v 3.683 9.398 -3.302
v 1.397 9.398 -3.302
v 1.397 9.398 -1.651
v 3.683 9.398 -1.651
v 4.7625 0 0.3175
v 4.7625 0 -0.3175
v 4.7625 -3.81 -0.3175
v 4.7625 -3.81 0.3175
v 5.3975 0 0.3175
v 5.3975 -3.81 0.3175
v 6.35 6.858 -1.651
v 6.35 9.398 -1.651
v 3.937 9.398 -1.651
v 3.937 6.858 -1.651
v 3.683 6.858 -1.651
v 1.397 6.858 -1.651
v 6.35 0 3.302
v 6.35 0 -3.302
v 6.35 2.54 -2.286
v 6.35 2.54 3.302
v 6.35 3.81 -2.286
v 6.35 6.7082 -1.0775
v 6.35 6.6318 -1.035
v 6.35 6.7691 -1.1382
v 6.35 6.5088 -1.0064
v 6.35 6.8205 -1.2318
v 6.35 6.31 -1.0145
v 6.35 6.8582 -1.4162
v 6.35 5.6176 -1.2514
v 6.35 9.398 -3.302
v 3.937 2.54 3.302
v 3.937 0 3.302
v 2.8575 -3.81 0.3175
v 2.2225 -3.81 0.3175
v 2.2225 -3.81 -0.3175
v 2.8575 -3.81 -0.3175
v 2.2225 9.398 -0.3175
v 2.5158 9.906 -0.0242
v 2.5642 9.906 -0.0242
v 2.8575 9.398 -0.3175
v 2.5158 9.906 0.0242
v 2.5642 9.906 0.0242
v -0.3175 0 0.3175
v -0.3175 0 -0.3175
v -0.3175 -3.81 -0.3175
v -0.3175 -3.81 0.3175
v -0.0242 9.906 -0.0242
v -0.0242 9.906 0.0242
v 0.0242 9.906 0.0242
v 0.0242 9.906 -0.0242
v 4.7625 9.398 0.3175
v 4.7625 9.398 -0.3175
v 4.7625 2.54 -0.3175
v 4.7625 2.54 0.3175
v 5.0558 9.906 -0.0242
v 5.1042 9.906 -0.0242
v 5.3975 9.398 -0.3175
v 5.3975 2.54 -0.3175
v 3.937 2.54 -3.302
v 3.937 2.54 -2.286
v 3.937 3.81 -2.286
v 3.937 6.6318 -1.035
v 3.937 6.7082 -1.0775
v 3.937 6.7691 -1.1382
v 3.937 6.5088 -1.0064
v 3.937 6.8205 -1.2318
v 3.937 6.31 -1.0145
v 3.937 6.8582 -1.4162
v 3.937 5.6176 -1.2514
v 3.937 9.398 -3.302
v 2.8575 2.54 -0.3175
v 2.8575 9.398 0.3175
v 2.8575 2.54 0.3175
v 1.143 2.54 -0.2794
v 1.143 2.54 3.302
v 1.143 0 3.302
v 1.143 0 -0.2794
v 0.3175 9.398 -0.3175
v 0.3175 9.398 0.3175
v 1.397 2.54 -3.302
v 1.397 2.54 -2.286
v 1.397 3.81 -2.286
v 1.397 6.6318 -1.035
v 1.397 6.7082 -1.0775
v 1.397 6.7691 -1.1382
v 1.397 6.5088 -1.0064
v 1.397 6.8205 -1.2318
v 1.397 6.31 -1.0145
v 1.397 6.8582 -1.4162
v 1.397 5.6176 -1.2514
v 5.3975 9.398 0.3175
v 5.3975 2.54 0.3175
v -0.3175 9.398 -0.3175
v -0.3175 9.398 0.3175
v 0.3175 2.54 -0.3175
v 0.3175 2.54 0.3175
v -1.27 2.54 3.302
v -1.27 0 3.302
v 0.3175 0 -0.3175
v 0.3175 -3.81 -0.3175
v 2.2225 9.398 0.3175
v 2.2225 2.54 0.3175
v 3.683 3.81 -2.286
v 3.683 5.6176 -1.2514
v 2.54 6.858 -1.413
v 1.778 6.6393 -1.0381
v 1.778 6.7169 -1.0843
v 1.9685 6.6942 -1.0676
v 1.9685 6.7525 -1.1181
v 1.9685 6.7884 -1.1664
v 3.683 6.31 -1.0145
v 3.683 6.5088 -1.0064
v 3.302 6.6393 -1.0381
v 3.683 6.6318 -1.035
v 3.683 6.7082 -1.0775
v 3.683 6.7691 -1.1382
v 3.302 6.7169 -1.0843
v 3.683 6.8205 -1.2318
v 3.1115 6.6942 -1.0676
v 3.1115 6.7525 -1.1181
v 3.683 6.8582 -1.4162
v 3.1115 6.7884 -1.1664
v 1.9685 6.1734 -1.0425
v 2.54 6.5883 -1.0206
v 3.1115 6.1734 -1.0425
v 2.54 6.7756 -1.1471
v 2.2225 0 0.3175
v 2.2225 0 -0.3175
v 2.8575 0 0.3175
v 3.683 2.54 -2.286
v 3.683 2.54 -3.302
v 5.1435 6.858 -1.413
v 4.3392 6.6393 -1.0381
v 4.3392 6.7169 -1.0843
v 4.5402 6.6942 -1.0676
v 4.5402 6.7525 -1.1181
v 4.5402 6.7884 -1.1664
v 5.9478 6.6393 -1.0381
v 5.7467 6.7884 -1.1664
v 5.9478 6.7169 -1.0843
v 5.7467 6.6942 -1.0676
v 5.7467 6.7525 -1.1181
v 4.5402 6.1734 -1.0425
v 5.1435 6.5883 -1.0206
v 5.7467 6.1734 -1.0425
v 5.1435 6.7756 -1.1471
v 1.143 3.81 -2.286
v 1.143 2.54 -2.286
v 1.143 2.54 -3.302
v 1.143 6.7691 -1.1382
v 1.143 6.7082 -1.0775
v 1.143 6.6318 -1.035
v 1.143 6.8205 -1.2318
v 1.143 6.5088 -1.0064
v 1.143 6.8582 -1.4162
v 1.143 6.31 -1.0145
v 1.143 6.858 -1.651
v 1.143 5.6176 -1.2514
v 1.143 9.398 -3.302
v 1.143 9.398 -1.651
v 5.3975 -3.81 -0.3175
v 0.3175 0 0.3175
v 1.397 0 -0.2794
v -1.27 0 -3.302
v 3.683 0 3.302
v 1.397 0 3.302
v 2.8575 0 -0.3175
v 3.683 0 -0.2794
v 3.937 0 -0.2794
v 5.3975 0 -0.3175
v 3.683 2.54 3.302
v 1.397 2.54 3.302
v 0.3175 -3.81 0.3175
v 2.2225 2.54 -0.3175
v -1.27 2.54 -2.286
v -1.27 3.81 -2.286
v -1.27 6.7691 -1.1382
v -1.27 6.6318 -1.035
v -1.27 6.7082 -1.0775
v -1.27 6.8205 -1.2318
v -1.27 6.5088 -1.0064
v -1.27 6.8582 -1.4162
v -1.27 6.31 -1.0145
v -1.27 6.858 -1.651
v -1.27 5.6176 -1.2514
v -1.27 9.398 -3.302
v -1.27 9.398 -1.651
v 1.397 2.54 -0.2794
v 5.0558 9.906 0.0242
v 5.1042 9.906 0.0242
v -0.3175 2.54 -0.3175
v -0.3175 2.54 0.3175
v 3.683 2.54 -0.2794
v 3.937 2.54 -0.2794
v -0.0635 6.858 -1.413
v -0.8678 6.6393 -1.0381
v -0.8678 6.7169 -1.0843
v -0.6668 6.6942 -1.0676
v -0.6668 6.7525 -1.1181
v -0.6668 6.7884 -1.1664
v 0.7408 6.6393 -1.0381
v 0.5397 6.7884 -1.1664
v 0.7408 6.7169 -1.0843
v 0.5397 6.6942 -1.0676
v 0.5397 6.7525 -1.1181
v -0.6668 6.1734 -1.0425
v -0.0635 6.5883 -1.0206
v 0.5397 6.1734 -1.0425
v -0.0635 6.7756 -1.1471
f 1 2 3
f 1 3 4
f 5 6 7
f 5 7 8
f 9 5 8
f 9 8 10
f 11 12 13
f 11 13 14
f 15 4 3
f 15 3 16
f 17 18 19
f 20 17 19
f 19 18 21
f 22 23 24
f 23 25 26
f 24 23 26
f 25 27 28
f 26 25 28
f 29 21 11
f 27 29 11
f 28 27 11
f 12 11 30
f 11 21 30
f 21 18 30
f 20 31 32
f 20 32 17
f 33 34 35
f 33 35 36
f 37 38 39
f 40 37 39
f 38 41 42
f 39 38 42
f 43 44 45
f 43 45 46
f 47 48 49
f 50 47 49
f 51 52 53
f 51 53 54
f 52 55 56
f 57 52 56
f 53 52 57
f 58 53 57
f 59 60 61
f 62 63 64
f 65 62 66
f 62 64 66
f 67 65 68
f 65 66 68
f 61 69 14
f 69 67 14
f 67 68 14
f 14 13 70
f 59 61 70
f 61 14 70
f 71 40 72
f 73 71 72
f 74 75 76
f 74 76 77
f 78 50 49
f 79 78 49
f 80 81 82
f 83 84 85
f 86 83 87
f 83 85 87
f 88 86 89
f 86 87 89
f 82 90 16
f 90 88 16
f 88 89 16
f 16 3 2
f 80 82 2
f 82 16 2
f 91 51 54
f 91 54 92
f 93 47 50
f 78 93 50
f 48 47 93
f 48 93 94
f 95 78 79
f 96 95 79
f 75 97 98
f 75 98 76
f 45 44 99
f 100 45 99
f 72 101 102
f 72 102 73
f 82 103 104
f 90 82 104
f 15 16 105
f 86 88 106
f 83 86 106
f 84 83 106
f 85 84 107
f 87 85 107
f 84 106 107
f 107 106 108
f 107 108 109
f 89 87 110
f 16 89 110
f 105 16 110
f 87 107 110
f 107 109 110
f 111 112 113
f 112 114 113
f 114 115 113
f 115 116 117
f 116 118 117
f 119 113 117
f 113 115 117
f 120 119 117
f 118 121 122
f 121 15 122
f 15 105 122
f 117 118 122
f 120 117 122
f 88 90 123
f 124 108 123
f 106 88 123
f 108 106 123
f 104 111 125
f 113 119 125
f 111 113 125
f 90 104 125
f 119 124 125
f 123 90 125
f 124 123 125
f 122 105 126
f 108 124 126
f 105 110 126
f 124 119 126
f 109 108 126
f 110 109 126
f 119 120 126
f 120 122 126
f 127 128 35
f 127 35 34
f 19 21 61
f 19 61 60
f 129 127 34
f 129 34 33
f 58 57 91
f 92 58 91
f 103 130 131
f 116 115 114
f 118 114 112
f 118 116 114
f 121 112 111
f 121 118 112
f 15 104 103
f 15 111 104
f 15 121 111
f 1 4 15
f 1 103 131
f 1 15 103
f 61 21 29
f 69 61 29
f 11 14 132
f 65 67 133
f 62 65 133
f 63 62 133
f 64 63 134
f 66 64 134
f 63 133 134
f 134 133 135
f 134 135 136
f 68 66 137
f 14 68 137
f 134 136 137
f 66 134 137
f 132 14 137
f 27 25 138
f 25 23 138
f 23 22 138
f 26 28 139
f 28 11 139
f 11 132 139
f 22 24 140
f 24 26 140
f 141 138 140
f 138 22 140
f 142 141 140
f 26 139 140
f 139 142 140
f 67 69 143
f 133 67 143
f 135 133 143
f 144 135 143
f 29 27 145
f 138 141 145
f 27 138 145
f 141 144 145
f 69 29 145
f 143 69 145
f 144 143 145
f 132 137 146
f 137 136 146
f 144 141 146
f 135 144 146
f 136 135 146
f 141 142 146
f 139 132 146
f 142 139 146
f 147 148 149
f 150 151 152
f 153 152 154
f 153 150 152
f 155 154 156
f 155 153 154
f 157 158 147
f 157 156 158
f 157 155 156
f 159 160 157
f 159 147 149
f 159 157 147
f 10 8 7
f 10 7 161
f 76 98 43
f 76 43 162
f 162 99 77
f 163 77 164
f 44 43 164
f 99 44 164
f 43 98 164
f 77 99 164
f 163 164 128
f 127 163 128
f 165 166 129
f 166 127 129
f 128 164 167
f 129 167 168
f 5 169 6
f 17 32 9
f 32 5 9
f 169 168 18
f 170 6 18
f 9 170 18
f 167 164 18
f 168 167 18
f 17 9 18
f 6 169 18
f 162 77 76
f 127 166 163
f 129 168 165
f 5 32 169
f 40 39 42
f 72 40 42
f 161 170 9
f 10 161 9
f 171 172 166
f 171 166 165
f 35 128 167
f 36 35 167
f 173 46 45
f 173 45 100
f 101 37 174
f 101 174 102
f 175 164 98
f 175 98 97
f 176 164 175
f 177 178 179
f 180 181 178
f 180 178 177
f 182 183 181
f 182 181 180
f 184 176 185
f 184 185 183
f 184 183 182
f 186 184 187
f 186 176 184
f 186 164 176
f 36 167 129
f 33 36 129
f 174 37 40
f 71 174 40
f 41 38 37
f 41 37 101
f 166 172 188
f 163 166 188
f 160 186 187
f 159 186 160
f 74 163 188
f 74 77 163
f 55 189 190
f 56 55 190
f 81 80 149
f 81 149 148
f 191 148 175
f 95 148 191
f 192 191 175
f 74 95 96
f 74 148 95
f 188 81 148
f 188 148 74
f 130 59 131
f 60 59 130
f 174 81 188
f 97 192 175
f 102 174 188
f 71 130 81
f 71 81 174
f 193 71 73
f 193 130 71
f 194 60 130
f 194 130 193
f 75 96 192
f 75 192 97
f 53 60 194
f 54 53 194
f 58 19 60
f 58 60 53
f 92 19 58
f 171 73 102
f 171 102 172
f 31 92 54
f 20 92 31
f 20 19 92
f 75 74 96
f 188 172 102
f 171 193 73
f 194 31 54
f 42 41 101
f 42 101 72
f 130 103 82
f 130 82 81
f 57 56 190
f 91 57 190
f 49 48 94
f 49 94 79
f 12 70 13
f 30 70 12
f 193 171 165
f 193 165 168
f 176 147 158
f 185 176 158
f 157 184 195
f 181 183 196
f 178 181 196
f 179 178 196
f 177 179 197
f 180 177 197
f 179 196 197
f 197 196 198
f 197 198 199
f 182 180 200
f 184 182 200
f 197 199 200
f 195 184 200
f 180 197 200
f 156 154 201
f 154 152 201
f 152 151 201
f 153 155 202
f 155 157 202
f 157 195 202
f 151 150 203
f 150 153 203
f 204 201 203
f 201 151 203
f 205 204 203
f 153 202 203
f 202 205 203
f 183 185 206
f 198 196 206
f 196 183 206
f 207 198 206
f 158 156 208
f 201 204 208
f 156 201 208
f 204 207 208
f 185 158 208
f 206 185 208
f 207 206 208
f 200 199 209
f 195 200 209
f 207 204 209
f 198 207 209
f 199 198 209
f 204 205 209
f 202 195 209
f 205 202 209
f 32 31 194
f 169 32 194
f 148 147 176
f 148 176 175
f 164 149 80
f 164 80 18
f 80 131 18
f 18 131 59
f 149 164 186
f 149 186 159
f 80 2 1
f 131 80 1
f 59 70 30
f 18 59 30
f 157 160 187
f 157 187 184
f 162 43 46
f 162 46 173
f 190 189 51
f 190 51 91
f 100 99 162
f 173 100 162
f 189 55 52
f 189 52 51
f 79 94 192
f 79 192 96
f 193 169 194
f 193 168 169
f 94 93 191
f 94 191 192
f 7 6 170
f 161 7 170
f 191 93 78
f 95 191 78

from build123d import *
from OCP.BRepFilletAPI import BRepFilletAPI_MakeChamfer

# Parameters (mm, degrees)
BASE_EXTRUDE_DEPTH          = 3.302
BASE_EXTRUDE_DEPTH_BACK     = 3.302
SKETCH3_W                   = 7.62
SKETCH3_H                   = 9.398
CUT_EXTRUDE1_START          = -7.62
CUT_EXTRUDE1_DEPTH          = 7.62
SKETCH5_W                   = 3.5814
SKETCH5_H                   = 2.54
CUT_EXTRUDE2_DEPTH          = 0.127
BOSS_EXTRUDE1_START         = -9.906
SKETCH6_W                   = 0.635
SKETCH6_H                   = 0.635
BOSS_EXTRUDE1_DEPTH         = 13.716
CHAMFER1_SIZE               = 0.508
CHAMFER1_SIZE2              = 0.293293937
LPATTERN2_COUNT             = 3
LPATTERN2_PITCH             = 2.54
CHAMFER1_OF_LPATTERN2_SIZE  = 0.508
CHAMFER1_OF_LPATTERN2_SIZE2 = 0.293293937
LPATTERN3_COUNT             = 2
LPATTERN3_PITCH             = 2.54


# Read off the part's stored shape, not the designer's step: Cut-Extrude1
with BuildPart() as part:
    # Sketch3 → Base-Extrude (new, two sides: drawn at the far end of the back side and taken through both)
    with BuildSketch(Plane.XY.offset(-BASE_EXTRUDE_DEPTH_BACK)):
        with Locations((2.54, 4.699)):
            Rectangle(SKETCH3_W, SKETCH3_H)
    extrude(amount=BASE_EXTRUDE_DEPTH + BASE_EXTRUDE_DEPTH_BACK)

    # Cut-Extrude1 outline → Cut-Extrude1 (cut)
    with BuildSketch(Plane.ZY.offset(1.27).offset(CUT_EXTRUDE1_START)):
        with BuildLine():
            add(Edge.make_bspline(
                [(-2.286, 3.81), (-1.368133743, 5.298530644), (-0.381370103, 6.898794196), (-1.568138006, 6.86066242), (-1.651, 6.858)],
                knots=[0, 0, 0, 0, 0.930178433, 1, 1, 1, 1], degree=3))
            Line((-2.286, 3.81), (-2.286, 2.54))
            Line((-2.286, 2.54), (3.302, 2.54))
            Line((3.302, 2.54), (3.302, 9.398))
            Line((3.302, 9.398), (-1.651, 9.398))
            Line((-1.651, 9.398), (-1.651, 6.858))
        make_face()
    extrude(amount=CUT_EXTRUDE1_DEPTH, mode=Mode.SUBTRACT)

    # Sketch5 → Cut-Extrude2 (cut, symmetric)
    with BuildSketch(Plane(origin=(1.27, 0, 0), x_dir=(0, 0, -1), z_dir=(1, 0, 0))):
        with Locations((-1.5113, 1.27)):
            Rectangle(SKETCH5_W, SKETCH5_H)
        with BuildLine():
            Line((3.302, 2.54), (3.302, 9.398))
            Line((3.302, 9.398), (1.651, 9.398))
            Line((1.651, 9.398), (1.651, 6.858))
            add(Edge.make_bspline(
                [(2.286, 3.81), (1.368133743, 5.298530644), (0.381370103, 6.898794196), (1.568138006, 6.86066242), (1.651, 6.858)],
                knots=[0, 0, 0, 0, 0.930178433, 1, 1, 1, 1], degree=3))
            Line((2.286, 3.81), (2.286, 2.54))
            Line((2.286, 2.54), (3.302, 2.54))
        make_face()
    cut_extrude2 = extrude(amount=CUT_EXTRUDE2_DEPTH, both=True, mode=Mode.SUBTRACT)

    # Sketch6 → Boss-Extrude1 (add)
    with BuildSketch(Plane.XZ.offset(BOSS_EXTRUDE1_START)):
        Rectangle(SKETCH6_W, SKETCH6_H)
    boss_extrude1 = extrude(amount=BOSS_EXTRUDE1_DEPTH)

    # Chamfer1: one chamfer whose edges measure the first distance from different faces: ONE call of the kernel's chamfer builder (chamfer() names one face for all edges)
    chamfer1_edges_1 = [part.edges().sort_by_distance(p)[0] for p in [
        (-0.3175, 9.906, 0),
    ]]
    chamfer1_side_1 = [part.faces().sort_by_distance(p)[0] for p in [
        (-0.3175, 6.223, 0),
    ]]
    chamfer1_edges_2 = [part.edges().sort_by_distance(p)[0] for p in [
        (0, 9.906, -0.3175),
    ]]
    chamfer1_side_2 = [part.faces().sort_by_distance(p)[0] for p in [
        (0, 6.223, -0.3175),
    ]]
    chamfer1_edges_3 = [part.edges().sort_by_distance(p)[0] for p in [
        (0.3175, 9.906, 0),
    ]]
    chamfer1_side_3 = [part.faces().sort_by_distance(p)[0] for p in [
        (0.3175, 6.223, 0),
    ]]
    chamfer1_edges_4 = [part.edges().sort_by_distance(p)[0] for p in [
        (0, 9.906, 0.3175),
    ]]
    chamfer1_side_4 = [part.faces().sort_by_distance(p)[0] for p in [
        (0, 6.223, 0.3175),
    ]]
    chamfer1 = BRepFilletAPI_MakeChamfer(part.part.solid().wrapped)
    for e in chamfer1_edges_1:
        chamfer1.Add(CHAMFER1_SIZE, CHAMFER1_SIZE2, e.wrapped, chamfer1_side_1[0].wrapped)  # the first distance lies on this face
    for e in chamfer1_edges_2:
        chamfer1.Add(CHAMFER1_SIZE, CHAMFER1_SIZE2, e.wrapped, chamfer1_side_2[0].wrapped)  # the first distance lies on this face
    for e in chamfer1_edges_3:
        chamfer1.Add(CHAMFER1_SIZE, CHAMFER1_SIZE2, e.wrapped, chamfer1_side_3[0].wrapped)  # the first distance lies on this face
    for e in chamfer1_edges_4:
        chamfer1.Add(CHAMFER1_SIZE, CHAMFER1_SIZE2, e.wrapped, chamfer1_side_4[0].wrapped)  # the first distance lies on this face
    add(Compound.cast(chamfer1.Shape()), mode=Mode.REPLACE)

    # LPattern2: Boss-Extrude1 ×3
    with Locations(*[(i * LPATTERN2_PITCH, 0, 0) for i in range(1, LPATTERN2_COUNT)]):
        add(boss_extrude1)

    # Chamfer1 of LPattern2: one chamfer whose edges measure the first distance from different faces: ONE call of the kernel's chamfer builder (chamfer() names one face for all edges)
    chamfer1_of_lpattern2_edges_1 = [part.edges().sort_by_distance(p)[0] for p in [
        (2.2225, 9.906, 0),
    ]]
    chamfer1_of_lpattern2_side_1 = [part.faces().sort_by_distance(p)[0] for p in [
        (2.2225, 6.223, 0),
    ]]
    chamfer1_of_lpattern2_edges_2 = [part.edges().sort_by_distance(p)[0] for p in [
        (2.54, 9.906, -0.3175),
    ]]
    chamfer1_of_lpattern2_side_2 = [part.faces().sort_by_distance(p)[0] for p in [
        (2.54, 6.223, -0.3175),
    ]]
    chamfer1_of_lpattern2_edges_3 = [part.edges().sort_by_distance(p)[0] for p in [
        (2.8575, 9.906, 0),
    ]]
    chamfer1_of_lpattern2_side_3 = [part.faces().sort_by_distance(p)[0] for p in [
        (2.8575, 6.223, 0),
    ]]
    chamfer1_of_lpattern2_edges_4 = [part.edges().sort_by_distance(p)[0] for p in [
        (2.54, 9.906, 0.3175),
    ]]
    chamfer1_of_lpattern2_side_4 = [part.faces().sort_by_distance(p)[0] for p in [
        (2.54, 6.223, 0.3175),
    ]]
    chamfer1_of_lpattern2_edges_5 = [part.edges().sort_by_distance(p)[0] for p in [
        (4.7625, 9.906, 0),
    ]]
    chamfer1_of_lpattern2_side_5 = [part.faces().sort_by_distance(p)[0] for p in [
        (4.7625, 6.223, 0),
    ]]
    chamfer1_of_lpattern2_edges_6 = [part.edges().sort_by_distance(p)[0] for p in [
        (5.08, 9.906, -0.3175),
    ]]
    chamfer1_of_lpattern2_side_6 = [part.faces().sort_by_distance(p)[0] for p in [
        (5.08, 6.223, -0.3175),
    ]]
    chamfer1_of_lpattern2_edges_7 = [part.edges().sort_by_distance(p)[0] for p in [
        (5.3975, 9.906, 0),
    ]]
    chamfer1_of_lpattern2_side_7 = [part.faces().sort_by_distance(p)[0] for p in [
        (5.3975, 6.223, 0),
    ]]
    chamfer1_of_lpattern2_edges_8 = [part.edges().sort_by_distance(p)[0] for p in [
        (5.08, 9.906, 0.3175),
    ]]
    chamfer1_of_lpattern2_side_8 = [part.faces().sort_by_distance(p)[0] for p in [
        (5.08, 6.223, 0.3175),
    ]]
    chamfer1_of_lpattern2 = BRepFilletAPI_MakeChamfer(part.part.solid().wrapped)
    for e in chamfer1_of_lpattern2_edges_1:
        chamfer1_of_lpattern2.Add(CHAMFER1_OF_LPATTERN2_SIZE, CHAMFER1_OF_LPATTERN2_SIZE2, e.wrapped, chamfer1_of_lpattern2_side_1[0].wrapped)  # the first distance lies on this face
    for e in chamfer1_of_lpattern2_edges_2:
        chamfer1_of_lpattern2.Add(CHAMFER1_OF_LPATTERN2_SIZE, CHAMFER1_OF_LPATTERN2_SIZE2, e.wrapped, chamfer1_of_lpattern2_side_2[0].wrapped)  # the first distance lies on this face
    for e in chamfer1_of_lpattern2_edges_3:
        chamfer1_of_lpattern2.Add(CHAMFER1_OF_LPATTERN2_SIZE, CHAMFER1_OF_LPATTERN2_SIZE2, e.wrapped, chamfer1_of_lpattern2_side_3[0].wrapped)  # the first distance lies on this face
    for e in chamfer1_of_lpattern2_edges_4:
        chamfer1_of_lpattern2.Add(CHAMFER1_OF_LPATTERN2_SIZE, CHAMFER1_OF_LPATTERN2_SIZE2, e.wrapped, chamfer1_of_lpattern2_side_4[0].wrapped)  # the first distance lies on this face
    for e in chamfer1_of_lpattern2_edges_5:
        chamfer1_of_lpattern2.Add(CHAMFER1_OF_LPATTERN2_SIZE, CHAMFER1_OF_LPATTERN2_SIZE2, e.wrapped, chamfer1_of_lpattern2_side_5[0].wrapped)  # the first distance lies on this face
    for e in chamfer1_of_lpattern2_edges_6:
        chamfer1_of_lpattern2.Add(CHAMFER1_OF_LPATTERN2_SIZE, CHAMFER1_OF_LPATTERN2_SIZE2, e.wrapped, chamfer1_of_lpattern2_side_6[0].wrapped)  # the first distance lies on this face
    for e in chamfer1_of_lpattern2_edges_7:
        chamfer1_of_lpattern2.Add(CHAMFER1_OF_LPATTERN2_SIZE, CHAMFER1_OF_LPATTERN2_SIZE2, e.wrapped, chamfer1_of_lpattern2_side_7[0].wrapped)  # the first distance lies on this face
    for e in chamfer1_of_lpattern2_edges_8:
        chamfer1_of_lpattern2.Add(CHAMFER1_OF_LPATTERN2_SIZE, CHAMFER1_OF_LPATTERN2_SIZE2, e.wrapped, chamfer1_of_lpattern2_side_8[0].wrapped)  # the first distance lies on this face
    add(Compound.cast(chamfer1_of_lpattern2.Shape()), mode=Mode.REPLACE)

    # LPattern3: Cut-Extrude2 ×2
    with Locations(*[(i * LPATTERN3_PITCH, 0, 0) for i in range(1, LPATTERN3_COUNT)]):
        add(cut_extrude2, mode=Mode.SUBTRACT)


solid = part.part
